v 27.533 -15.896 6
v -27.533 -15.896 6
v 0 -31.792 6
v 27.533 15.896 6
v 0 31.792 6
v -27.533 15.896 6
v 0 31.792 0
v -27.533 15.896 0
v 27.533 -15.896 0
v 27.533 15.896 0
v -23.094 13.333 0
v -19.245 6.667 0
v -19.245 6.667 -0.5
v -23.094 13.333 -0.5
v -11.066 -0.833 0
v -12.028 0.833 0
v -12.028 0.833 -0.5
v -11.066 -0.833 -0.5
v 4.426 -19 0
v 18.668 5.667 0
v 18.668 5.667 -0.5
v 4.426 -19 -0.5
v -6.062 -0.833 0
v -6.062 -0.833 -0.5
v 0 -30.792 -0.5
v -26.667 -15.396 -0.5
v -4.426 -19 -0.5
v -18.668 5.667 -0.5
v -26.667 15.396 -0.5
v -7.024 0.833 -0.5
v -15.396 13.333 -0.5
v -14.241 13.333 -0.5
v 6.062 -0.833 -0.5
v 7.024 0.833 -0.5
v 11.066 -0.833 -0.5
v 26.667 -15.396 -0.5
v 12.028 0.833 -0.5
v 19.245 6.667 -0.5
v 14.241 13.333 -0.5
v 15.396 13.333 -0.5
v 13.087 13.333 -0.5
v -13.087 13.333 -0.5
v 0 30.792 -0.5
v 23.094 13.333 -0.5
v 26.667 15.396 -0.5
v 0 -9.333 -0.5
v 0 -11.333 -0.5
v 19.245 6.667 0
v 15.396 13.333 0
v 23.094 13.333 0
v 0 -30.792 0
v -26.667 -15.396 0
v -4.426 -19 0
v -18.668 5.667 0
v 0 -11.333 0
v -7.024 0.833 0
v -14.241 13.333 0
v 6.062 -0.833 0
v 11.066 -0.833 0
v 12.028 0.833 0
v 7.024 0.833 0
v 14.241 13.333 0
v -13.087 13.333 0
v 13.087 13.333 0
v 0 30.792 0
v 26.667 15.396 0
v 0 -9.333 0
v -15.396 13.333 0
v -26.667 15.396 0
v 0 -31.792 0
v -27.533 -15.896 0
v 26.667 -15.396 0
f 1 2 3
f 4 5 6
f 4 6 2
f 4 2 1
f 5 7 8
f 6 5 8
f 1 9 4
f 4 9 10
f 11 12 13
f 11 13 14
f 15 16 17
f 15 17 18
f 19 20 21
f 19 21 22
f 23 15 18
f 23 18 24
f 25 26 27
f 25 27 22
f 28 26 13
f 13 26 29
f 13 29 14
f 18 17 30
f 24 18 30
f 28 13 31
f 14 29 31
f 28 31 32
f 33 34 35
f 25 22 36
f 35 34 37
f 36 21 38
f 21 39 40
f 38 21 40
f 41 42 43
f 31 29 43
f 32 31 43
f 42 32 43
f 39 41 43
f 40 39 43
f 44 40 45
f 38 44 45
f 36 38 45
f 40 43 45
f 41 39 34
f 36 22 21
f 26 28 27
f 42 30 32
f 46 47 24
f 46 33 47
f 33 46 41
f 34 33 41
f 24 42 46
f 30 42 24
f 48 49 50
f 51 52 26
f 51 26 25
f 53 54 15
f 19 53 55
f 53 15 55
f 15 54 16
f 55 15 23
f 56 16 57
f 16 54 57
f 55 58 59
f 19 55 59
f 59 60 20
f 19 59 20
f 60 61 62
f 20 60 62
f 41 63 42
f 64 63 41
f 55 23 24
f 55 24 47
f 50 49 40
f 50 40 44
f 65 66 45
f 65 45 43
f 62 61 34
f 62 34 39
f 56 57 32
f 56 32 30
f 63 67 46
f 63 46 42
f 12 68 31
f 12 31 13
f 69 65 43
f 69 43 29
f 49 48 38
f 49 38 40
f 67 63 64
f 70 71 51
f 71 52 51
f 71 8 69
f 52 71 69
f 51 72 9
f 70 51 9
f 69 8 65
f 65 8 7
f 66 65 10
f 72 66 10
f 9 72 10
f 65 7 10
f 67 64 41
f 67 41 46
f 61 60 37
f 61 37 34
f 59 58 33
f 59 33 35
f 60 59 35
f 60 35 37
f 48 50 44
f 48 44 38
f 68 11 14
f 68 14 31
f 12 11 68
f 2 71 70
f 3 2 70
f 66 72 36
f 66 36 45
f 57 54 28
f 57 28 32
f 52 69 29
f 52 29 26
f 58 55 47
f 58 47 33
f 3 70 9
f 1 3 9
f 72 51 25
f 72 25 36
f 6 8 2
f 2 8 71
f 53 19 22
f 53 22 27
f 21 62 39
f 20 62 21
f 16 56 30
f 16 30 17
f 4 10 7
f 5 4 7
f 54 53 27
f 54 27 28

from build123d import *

# Parameters (mm, degrees)
BOSS_EXTRUDE1_DEPTH = 6
BOSS_EXTRUDE2_DEPTH = 0.5


with BuildPart() as part:
    # Sketch1 → Boss-Extrude1 (new body)
    with BuildSketch(Plane.XY):
        Polygon((27.53269207, 15.896007178), (0, 31.792014357), (-27.53269207, 15.896007178), (-27.53269207, -15.896007178), (0, -31.792014357), (27.53269207, -15.896007178), align=None)
    extrude(amount=BOSS_EXTRUDE1_DEPTH)

    # Sketch1<3> → Boss-Extrude2 (add)
    with BuildSketch(Plane.XY):
        Polygon((26.666666667, 15.396007178), (0, 30.792014357), (-26.666666667, 15.396007178), (-26.666666667, -15.396007178), (0, -30.792014357), (26.666666667, -15.396007178), align=None)
        Polygon((12.028130608, 0.833333333), (7.024428275, 0.833333333), (14.24130664, 13.333333333), (18.667658704, 5.666666667), (4.426352064, -19), (-4.426352064, -19), (-18.667658704, 5.666666667), (-14.24130664, 13.333333333), (-7.024428275, 0.833333333), (-12.028130608, 0.833333333), (-11.065880159, -0.833333333), (-6.062177826, -0.833333333), (0, -11.333333333), (6.062177826, -0.833333333), (11.065880159, -0.833333333), align=None, mode=Mode.SUBTRACT)
        Polygon((-15.396007178, 13.333333333), (-19.245008973, 6.666666667), (-23.094010768, 13.333333333), align=None, mode=Mode.SUBTRACT)
        Polygon((0, -9.333333333), (-13.086606102, 13.333333333), (13.086606102, 13.333333333), align=None, mode=Mode.SUBTRACT)
        Polygon((23.094010768, 13.333333333), (19.245008973, 6.666666667), (15.396007178, 13.333333333), align=None, mode=Mode.SUBTRACT)
    extrude(amount=-BOSS_EXTRUDE2_DEPTH)


solid = part.part
